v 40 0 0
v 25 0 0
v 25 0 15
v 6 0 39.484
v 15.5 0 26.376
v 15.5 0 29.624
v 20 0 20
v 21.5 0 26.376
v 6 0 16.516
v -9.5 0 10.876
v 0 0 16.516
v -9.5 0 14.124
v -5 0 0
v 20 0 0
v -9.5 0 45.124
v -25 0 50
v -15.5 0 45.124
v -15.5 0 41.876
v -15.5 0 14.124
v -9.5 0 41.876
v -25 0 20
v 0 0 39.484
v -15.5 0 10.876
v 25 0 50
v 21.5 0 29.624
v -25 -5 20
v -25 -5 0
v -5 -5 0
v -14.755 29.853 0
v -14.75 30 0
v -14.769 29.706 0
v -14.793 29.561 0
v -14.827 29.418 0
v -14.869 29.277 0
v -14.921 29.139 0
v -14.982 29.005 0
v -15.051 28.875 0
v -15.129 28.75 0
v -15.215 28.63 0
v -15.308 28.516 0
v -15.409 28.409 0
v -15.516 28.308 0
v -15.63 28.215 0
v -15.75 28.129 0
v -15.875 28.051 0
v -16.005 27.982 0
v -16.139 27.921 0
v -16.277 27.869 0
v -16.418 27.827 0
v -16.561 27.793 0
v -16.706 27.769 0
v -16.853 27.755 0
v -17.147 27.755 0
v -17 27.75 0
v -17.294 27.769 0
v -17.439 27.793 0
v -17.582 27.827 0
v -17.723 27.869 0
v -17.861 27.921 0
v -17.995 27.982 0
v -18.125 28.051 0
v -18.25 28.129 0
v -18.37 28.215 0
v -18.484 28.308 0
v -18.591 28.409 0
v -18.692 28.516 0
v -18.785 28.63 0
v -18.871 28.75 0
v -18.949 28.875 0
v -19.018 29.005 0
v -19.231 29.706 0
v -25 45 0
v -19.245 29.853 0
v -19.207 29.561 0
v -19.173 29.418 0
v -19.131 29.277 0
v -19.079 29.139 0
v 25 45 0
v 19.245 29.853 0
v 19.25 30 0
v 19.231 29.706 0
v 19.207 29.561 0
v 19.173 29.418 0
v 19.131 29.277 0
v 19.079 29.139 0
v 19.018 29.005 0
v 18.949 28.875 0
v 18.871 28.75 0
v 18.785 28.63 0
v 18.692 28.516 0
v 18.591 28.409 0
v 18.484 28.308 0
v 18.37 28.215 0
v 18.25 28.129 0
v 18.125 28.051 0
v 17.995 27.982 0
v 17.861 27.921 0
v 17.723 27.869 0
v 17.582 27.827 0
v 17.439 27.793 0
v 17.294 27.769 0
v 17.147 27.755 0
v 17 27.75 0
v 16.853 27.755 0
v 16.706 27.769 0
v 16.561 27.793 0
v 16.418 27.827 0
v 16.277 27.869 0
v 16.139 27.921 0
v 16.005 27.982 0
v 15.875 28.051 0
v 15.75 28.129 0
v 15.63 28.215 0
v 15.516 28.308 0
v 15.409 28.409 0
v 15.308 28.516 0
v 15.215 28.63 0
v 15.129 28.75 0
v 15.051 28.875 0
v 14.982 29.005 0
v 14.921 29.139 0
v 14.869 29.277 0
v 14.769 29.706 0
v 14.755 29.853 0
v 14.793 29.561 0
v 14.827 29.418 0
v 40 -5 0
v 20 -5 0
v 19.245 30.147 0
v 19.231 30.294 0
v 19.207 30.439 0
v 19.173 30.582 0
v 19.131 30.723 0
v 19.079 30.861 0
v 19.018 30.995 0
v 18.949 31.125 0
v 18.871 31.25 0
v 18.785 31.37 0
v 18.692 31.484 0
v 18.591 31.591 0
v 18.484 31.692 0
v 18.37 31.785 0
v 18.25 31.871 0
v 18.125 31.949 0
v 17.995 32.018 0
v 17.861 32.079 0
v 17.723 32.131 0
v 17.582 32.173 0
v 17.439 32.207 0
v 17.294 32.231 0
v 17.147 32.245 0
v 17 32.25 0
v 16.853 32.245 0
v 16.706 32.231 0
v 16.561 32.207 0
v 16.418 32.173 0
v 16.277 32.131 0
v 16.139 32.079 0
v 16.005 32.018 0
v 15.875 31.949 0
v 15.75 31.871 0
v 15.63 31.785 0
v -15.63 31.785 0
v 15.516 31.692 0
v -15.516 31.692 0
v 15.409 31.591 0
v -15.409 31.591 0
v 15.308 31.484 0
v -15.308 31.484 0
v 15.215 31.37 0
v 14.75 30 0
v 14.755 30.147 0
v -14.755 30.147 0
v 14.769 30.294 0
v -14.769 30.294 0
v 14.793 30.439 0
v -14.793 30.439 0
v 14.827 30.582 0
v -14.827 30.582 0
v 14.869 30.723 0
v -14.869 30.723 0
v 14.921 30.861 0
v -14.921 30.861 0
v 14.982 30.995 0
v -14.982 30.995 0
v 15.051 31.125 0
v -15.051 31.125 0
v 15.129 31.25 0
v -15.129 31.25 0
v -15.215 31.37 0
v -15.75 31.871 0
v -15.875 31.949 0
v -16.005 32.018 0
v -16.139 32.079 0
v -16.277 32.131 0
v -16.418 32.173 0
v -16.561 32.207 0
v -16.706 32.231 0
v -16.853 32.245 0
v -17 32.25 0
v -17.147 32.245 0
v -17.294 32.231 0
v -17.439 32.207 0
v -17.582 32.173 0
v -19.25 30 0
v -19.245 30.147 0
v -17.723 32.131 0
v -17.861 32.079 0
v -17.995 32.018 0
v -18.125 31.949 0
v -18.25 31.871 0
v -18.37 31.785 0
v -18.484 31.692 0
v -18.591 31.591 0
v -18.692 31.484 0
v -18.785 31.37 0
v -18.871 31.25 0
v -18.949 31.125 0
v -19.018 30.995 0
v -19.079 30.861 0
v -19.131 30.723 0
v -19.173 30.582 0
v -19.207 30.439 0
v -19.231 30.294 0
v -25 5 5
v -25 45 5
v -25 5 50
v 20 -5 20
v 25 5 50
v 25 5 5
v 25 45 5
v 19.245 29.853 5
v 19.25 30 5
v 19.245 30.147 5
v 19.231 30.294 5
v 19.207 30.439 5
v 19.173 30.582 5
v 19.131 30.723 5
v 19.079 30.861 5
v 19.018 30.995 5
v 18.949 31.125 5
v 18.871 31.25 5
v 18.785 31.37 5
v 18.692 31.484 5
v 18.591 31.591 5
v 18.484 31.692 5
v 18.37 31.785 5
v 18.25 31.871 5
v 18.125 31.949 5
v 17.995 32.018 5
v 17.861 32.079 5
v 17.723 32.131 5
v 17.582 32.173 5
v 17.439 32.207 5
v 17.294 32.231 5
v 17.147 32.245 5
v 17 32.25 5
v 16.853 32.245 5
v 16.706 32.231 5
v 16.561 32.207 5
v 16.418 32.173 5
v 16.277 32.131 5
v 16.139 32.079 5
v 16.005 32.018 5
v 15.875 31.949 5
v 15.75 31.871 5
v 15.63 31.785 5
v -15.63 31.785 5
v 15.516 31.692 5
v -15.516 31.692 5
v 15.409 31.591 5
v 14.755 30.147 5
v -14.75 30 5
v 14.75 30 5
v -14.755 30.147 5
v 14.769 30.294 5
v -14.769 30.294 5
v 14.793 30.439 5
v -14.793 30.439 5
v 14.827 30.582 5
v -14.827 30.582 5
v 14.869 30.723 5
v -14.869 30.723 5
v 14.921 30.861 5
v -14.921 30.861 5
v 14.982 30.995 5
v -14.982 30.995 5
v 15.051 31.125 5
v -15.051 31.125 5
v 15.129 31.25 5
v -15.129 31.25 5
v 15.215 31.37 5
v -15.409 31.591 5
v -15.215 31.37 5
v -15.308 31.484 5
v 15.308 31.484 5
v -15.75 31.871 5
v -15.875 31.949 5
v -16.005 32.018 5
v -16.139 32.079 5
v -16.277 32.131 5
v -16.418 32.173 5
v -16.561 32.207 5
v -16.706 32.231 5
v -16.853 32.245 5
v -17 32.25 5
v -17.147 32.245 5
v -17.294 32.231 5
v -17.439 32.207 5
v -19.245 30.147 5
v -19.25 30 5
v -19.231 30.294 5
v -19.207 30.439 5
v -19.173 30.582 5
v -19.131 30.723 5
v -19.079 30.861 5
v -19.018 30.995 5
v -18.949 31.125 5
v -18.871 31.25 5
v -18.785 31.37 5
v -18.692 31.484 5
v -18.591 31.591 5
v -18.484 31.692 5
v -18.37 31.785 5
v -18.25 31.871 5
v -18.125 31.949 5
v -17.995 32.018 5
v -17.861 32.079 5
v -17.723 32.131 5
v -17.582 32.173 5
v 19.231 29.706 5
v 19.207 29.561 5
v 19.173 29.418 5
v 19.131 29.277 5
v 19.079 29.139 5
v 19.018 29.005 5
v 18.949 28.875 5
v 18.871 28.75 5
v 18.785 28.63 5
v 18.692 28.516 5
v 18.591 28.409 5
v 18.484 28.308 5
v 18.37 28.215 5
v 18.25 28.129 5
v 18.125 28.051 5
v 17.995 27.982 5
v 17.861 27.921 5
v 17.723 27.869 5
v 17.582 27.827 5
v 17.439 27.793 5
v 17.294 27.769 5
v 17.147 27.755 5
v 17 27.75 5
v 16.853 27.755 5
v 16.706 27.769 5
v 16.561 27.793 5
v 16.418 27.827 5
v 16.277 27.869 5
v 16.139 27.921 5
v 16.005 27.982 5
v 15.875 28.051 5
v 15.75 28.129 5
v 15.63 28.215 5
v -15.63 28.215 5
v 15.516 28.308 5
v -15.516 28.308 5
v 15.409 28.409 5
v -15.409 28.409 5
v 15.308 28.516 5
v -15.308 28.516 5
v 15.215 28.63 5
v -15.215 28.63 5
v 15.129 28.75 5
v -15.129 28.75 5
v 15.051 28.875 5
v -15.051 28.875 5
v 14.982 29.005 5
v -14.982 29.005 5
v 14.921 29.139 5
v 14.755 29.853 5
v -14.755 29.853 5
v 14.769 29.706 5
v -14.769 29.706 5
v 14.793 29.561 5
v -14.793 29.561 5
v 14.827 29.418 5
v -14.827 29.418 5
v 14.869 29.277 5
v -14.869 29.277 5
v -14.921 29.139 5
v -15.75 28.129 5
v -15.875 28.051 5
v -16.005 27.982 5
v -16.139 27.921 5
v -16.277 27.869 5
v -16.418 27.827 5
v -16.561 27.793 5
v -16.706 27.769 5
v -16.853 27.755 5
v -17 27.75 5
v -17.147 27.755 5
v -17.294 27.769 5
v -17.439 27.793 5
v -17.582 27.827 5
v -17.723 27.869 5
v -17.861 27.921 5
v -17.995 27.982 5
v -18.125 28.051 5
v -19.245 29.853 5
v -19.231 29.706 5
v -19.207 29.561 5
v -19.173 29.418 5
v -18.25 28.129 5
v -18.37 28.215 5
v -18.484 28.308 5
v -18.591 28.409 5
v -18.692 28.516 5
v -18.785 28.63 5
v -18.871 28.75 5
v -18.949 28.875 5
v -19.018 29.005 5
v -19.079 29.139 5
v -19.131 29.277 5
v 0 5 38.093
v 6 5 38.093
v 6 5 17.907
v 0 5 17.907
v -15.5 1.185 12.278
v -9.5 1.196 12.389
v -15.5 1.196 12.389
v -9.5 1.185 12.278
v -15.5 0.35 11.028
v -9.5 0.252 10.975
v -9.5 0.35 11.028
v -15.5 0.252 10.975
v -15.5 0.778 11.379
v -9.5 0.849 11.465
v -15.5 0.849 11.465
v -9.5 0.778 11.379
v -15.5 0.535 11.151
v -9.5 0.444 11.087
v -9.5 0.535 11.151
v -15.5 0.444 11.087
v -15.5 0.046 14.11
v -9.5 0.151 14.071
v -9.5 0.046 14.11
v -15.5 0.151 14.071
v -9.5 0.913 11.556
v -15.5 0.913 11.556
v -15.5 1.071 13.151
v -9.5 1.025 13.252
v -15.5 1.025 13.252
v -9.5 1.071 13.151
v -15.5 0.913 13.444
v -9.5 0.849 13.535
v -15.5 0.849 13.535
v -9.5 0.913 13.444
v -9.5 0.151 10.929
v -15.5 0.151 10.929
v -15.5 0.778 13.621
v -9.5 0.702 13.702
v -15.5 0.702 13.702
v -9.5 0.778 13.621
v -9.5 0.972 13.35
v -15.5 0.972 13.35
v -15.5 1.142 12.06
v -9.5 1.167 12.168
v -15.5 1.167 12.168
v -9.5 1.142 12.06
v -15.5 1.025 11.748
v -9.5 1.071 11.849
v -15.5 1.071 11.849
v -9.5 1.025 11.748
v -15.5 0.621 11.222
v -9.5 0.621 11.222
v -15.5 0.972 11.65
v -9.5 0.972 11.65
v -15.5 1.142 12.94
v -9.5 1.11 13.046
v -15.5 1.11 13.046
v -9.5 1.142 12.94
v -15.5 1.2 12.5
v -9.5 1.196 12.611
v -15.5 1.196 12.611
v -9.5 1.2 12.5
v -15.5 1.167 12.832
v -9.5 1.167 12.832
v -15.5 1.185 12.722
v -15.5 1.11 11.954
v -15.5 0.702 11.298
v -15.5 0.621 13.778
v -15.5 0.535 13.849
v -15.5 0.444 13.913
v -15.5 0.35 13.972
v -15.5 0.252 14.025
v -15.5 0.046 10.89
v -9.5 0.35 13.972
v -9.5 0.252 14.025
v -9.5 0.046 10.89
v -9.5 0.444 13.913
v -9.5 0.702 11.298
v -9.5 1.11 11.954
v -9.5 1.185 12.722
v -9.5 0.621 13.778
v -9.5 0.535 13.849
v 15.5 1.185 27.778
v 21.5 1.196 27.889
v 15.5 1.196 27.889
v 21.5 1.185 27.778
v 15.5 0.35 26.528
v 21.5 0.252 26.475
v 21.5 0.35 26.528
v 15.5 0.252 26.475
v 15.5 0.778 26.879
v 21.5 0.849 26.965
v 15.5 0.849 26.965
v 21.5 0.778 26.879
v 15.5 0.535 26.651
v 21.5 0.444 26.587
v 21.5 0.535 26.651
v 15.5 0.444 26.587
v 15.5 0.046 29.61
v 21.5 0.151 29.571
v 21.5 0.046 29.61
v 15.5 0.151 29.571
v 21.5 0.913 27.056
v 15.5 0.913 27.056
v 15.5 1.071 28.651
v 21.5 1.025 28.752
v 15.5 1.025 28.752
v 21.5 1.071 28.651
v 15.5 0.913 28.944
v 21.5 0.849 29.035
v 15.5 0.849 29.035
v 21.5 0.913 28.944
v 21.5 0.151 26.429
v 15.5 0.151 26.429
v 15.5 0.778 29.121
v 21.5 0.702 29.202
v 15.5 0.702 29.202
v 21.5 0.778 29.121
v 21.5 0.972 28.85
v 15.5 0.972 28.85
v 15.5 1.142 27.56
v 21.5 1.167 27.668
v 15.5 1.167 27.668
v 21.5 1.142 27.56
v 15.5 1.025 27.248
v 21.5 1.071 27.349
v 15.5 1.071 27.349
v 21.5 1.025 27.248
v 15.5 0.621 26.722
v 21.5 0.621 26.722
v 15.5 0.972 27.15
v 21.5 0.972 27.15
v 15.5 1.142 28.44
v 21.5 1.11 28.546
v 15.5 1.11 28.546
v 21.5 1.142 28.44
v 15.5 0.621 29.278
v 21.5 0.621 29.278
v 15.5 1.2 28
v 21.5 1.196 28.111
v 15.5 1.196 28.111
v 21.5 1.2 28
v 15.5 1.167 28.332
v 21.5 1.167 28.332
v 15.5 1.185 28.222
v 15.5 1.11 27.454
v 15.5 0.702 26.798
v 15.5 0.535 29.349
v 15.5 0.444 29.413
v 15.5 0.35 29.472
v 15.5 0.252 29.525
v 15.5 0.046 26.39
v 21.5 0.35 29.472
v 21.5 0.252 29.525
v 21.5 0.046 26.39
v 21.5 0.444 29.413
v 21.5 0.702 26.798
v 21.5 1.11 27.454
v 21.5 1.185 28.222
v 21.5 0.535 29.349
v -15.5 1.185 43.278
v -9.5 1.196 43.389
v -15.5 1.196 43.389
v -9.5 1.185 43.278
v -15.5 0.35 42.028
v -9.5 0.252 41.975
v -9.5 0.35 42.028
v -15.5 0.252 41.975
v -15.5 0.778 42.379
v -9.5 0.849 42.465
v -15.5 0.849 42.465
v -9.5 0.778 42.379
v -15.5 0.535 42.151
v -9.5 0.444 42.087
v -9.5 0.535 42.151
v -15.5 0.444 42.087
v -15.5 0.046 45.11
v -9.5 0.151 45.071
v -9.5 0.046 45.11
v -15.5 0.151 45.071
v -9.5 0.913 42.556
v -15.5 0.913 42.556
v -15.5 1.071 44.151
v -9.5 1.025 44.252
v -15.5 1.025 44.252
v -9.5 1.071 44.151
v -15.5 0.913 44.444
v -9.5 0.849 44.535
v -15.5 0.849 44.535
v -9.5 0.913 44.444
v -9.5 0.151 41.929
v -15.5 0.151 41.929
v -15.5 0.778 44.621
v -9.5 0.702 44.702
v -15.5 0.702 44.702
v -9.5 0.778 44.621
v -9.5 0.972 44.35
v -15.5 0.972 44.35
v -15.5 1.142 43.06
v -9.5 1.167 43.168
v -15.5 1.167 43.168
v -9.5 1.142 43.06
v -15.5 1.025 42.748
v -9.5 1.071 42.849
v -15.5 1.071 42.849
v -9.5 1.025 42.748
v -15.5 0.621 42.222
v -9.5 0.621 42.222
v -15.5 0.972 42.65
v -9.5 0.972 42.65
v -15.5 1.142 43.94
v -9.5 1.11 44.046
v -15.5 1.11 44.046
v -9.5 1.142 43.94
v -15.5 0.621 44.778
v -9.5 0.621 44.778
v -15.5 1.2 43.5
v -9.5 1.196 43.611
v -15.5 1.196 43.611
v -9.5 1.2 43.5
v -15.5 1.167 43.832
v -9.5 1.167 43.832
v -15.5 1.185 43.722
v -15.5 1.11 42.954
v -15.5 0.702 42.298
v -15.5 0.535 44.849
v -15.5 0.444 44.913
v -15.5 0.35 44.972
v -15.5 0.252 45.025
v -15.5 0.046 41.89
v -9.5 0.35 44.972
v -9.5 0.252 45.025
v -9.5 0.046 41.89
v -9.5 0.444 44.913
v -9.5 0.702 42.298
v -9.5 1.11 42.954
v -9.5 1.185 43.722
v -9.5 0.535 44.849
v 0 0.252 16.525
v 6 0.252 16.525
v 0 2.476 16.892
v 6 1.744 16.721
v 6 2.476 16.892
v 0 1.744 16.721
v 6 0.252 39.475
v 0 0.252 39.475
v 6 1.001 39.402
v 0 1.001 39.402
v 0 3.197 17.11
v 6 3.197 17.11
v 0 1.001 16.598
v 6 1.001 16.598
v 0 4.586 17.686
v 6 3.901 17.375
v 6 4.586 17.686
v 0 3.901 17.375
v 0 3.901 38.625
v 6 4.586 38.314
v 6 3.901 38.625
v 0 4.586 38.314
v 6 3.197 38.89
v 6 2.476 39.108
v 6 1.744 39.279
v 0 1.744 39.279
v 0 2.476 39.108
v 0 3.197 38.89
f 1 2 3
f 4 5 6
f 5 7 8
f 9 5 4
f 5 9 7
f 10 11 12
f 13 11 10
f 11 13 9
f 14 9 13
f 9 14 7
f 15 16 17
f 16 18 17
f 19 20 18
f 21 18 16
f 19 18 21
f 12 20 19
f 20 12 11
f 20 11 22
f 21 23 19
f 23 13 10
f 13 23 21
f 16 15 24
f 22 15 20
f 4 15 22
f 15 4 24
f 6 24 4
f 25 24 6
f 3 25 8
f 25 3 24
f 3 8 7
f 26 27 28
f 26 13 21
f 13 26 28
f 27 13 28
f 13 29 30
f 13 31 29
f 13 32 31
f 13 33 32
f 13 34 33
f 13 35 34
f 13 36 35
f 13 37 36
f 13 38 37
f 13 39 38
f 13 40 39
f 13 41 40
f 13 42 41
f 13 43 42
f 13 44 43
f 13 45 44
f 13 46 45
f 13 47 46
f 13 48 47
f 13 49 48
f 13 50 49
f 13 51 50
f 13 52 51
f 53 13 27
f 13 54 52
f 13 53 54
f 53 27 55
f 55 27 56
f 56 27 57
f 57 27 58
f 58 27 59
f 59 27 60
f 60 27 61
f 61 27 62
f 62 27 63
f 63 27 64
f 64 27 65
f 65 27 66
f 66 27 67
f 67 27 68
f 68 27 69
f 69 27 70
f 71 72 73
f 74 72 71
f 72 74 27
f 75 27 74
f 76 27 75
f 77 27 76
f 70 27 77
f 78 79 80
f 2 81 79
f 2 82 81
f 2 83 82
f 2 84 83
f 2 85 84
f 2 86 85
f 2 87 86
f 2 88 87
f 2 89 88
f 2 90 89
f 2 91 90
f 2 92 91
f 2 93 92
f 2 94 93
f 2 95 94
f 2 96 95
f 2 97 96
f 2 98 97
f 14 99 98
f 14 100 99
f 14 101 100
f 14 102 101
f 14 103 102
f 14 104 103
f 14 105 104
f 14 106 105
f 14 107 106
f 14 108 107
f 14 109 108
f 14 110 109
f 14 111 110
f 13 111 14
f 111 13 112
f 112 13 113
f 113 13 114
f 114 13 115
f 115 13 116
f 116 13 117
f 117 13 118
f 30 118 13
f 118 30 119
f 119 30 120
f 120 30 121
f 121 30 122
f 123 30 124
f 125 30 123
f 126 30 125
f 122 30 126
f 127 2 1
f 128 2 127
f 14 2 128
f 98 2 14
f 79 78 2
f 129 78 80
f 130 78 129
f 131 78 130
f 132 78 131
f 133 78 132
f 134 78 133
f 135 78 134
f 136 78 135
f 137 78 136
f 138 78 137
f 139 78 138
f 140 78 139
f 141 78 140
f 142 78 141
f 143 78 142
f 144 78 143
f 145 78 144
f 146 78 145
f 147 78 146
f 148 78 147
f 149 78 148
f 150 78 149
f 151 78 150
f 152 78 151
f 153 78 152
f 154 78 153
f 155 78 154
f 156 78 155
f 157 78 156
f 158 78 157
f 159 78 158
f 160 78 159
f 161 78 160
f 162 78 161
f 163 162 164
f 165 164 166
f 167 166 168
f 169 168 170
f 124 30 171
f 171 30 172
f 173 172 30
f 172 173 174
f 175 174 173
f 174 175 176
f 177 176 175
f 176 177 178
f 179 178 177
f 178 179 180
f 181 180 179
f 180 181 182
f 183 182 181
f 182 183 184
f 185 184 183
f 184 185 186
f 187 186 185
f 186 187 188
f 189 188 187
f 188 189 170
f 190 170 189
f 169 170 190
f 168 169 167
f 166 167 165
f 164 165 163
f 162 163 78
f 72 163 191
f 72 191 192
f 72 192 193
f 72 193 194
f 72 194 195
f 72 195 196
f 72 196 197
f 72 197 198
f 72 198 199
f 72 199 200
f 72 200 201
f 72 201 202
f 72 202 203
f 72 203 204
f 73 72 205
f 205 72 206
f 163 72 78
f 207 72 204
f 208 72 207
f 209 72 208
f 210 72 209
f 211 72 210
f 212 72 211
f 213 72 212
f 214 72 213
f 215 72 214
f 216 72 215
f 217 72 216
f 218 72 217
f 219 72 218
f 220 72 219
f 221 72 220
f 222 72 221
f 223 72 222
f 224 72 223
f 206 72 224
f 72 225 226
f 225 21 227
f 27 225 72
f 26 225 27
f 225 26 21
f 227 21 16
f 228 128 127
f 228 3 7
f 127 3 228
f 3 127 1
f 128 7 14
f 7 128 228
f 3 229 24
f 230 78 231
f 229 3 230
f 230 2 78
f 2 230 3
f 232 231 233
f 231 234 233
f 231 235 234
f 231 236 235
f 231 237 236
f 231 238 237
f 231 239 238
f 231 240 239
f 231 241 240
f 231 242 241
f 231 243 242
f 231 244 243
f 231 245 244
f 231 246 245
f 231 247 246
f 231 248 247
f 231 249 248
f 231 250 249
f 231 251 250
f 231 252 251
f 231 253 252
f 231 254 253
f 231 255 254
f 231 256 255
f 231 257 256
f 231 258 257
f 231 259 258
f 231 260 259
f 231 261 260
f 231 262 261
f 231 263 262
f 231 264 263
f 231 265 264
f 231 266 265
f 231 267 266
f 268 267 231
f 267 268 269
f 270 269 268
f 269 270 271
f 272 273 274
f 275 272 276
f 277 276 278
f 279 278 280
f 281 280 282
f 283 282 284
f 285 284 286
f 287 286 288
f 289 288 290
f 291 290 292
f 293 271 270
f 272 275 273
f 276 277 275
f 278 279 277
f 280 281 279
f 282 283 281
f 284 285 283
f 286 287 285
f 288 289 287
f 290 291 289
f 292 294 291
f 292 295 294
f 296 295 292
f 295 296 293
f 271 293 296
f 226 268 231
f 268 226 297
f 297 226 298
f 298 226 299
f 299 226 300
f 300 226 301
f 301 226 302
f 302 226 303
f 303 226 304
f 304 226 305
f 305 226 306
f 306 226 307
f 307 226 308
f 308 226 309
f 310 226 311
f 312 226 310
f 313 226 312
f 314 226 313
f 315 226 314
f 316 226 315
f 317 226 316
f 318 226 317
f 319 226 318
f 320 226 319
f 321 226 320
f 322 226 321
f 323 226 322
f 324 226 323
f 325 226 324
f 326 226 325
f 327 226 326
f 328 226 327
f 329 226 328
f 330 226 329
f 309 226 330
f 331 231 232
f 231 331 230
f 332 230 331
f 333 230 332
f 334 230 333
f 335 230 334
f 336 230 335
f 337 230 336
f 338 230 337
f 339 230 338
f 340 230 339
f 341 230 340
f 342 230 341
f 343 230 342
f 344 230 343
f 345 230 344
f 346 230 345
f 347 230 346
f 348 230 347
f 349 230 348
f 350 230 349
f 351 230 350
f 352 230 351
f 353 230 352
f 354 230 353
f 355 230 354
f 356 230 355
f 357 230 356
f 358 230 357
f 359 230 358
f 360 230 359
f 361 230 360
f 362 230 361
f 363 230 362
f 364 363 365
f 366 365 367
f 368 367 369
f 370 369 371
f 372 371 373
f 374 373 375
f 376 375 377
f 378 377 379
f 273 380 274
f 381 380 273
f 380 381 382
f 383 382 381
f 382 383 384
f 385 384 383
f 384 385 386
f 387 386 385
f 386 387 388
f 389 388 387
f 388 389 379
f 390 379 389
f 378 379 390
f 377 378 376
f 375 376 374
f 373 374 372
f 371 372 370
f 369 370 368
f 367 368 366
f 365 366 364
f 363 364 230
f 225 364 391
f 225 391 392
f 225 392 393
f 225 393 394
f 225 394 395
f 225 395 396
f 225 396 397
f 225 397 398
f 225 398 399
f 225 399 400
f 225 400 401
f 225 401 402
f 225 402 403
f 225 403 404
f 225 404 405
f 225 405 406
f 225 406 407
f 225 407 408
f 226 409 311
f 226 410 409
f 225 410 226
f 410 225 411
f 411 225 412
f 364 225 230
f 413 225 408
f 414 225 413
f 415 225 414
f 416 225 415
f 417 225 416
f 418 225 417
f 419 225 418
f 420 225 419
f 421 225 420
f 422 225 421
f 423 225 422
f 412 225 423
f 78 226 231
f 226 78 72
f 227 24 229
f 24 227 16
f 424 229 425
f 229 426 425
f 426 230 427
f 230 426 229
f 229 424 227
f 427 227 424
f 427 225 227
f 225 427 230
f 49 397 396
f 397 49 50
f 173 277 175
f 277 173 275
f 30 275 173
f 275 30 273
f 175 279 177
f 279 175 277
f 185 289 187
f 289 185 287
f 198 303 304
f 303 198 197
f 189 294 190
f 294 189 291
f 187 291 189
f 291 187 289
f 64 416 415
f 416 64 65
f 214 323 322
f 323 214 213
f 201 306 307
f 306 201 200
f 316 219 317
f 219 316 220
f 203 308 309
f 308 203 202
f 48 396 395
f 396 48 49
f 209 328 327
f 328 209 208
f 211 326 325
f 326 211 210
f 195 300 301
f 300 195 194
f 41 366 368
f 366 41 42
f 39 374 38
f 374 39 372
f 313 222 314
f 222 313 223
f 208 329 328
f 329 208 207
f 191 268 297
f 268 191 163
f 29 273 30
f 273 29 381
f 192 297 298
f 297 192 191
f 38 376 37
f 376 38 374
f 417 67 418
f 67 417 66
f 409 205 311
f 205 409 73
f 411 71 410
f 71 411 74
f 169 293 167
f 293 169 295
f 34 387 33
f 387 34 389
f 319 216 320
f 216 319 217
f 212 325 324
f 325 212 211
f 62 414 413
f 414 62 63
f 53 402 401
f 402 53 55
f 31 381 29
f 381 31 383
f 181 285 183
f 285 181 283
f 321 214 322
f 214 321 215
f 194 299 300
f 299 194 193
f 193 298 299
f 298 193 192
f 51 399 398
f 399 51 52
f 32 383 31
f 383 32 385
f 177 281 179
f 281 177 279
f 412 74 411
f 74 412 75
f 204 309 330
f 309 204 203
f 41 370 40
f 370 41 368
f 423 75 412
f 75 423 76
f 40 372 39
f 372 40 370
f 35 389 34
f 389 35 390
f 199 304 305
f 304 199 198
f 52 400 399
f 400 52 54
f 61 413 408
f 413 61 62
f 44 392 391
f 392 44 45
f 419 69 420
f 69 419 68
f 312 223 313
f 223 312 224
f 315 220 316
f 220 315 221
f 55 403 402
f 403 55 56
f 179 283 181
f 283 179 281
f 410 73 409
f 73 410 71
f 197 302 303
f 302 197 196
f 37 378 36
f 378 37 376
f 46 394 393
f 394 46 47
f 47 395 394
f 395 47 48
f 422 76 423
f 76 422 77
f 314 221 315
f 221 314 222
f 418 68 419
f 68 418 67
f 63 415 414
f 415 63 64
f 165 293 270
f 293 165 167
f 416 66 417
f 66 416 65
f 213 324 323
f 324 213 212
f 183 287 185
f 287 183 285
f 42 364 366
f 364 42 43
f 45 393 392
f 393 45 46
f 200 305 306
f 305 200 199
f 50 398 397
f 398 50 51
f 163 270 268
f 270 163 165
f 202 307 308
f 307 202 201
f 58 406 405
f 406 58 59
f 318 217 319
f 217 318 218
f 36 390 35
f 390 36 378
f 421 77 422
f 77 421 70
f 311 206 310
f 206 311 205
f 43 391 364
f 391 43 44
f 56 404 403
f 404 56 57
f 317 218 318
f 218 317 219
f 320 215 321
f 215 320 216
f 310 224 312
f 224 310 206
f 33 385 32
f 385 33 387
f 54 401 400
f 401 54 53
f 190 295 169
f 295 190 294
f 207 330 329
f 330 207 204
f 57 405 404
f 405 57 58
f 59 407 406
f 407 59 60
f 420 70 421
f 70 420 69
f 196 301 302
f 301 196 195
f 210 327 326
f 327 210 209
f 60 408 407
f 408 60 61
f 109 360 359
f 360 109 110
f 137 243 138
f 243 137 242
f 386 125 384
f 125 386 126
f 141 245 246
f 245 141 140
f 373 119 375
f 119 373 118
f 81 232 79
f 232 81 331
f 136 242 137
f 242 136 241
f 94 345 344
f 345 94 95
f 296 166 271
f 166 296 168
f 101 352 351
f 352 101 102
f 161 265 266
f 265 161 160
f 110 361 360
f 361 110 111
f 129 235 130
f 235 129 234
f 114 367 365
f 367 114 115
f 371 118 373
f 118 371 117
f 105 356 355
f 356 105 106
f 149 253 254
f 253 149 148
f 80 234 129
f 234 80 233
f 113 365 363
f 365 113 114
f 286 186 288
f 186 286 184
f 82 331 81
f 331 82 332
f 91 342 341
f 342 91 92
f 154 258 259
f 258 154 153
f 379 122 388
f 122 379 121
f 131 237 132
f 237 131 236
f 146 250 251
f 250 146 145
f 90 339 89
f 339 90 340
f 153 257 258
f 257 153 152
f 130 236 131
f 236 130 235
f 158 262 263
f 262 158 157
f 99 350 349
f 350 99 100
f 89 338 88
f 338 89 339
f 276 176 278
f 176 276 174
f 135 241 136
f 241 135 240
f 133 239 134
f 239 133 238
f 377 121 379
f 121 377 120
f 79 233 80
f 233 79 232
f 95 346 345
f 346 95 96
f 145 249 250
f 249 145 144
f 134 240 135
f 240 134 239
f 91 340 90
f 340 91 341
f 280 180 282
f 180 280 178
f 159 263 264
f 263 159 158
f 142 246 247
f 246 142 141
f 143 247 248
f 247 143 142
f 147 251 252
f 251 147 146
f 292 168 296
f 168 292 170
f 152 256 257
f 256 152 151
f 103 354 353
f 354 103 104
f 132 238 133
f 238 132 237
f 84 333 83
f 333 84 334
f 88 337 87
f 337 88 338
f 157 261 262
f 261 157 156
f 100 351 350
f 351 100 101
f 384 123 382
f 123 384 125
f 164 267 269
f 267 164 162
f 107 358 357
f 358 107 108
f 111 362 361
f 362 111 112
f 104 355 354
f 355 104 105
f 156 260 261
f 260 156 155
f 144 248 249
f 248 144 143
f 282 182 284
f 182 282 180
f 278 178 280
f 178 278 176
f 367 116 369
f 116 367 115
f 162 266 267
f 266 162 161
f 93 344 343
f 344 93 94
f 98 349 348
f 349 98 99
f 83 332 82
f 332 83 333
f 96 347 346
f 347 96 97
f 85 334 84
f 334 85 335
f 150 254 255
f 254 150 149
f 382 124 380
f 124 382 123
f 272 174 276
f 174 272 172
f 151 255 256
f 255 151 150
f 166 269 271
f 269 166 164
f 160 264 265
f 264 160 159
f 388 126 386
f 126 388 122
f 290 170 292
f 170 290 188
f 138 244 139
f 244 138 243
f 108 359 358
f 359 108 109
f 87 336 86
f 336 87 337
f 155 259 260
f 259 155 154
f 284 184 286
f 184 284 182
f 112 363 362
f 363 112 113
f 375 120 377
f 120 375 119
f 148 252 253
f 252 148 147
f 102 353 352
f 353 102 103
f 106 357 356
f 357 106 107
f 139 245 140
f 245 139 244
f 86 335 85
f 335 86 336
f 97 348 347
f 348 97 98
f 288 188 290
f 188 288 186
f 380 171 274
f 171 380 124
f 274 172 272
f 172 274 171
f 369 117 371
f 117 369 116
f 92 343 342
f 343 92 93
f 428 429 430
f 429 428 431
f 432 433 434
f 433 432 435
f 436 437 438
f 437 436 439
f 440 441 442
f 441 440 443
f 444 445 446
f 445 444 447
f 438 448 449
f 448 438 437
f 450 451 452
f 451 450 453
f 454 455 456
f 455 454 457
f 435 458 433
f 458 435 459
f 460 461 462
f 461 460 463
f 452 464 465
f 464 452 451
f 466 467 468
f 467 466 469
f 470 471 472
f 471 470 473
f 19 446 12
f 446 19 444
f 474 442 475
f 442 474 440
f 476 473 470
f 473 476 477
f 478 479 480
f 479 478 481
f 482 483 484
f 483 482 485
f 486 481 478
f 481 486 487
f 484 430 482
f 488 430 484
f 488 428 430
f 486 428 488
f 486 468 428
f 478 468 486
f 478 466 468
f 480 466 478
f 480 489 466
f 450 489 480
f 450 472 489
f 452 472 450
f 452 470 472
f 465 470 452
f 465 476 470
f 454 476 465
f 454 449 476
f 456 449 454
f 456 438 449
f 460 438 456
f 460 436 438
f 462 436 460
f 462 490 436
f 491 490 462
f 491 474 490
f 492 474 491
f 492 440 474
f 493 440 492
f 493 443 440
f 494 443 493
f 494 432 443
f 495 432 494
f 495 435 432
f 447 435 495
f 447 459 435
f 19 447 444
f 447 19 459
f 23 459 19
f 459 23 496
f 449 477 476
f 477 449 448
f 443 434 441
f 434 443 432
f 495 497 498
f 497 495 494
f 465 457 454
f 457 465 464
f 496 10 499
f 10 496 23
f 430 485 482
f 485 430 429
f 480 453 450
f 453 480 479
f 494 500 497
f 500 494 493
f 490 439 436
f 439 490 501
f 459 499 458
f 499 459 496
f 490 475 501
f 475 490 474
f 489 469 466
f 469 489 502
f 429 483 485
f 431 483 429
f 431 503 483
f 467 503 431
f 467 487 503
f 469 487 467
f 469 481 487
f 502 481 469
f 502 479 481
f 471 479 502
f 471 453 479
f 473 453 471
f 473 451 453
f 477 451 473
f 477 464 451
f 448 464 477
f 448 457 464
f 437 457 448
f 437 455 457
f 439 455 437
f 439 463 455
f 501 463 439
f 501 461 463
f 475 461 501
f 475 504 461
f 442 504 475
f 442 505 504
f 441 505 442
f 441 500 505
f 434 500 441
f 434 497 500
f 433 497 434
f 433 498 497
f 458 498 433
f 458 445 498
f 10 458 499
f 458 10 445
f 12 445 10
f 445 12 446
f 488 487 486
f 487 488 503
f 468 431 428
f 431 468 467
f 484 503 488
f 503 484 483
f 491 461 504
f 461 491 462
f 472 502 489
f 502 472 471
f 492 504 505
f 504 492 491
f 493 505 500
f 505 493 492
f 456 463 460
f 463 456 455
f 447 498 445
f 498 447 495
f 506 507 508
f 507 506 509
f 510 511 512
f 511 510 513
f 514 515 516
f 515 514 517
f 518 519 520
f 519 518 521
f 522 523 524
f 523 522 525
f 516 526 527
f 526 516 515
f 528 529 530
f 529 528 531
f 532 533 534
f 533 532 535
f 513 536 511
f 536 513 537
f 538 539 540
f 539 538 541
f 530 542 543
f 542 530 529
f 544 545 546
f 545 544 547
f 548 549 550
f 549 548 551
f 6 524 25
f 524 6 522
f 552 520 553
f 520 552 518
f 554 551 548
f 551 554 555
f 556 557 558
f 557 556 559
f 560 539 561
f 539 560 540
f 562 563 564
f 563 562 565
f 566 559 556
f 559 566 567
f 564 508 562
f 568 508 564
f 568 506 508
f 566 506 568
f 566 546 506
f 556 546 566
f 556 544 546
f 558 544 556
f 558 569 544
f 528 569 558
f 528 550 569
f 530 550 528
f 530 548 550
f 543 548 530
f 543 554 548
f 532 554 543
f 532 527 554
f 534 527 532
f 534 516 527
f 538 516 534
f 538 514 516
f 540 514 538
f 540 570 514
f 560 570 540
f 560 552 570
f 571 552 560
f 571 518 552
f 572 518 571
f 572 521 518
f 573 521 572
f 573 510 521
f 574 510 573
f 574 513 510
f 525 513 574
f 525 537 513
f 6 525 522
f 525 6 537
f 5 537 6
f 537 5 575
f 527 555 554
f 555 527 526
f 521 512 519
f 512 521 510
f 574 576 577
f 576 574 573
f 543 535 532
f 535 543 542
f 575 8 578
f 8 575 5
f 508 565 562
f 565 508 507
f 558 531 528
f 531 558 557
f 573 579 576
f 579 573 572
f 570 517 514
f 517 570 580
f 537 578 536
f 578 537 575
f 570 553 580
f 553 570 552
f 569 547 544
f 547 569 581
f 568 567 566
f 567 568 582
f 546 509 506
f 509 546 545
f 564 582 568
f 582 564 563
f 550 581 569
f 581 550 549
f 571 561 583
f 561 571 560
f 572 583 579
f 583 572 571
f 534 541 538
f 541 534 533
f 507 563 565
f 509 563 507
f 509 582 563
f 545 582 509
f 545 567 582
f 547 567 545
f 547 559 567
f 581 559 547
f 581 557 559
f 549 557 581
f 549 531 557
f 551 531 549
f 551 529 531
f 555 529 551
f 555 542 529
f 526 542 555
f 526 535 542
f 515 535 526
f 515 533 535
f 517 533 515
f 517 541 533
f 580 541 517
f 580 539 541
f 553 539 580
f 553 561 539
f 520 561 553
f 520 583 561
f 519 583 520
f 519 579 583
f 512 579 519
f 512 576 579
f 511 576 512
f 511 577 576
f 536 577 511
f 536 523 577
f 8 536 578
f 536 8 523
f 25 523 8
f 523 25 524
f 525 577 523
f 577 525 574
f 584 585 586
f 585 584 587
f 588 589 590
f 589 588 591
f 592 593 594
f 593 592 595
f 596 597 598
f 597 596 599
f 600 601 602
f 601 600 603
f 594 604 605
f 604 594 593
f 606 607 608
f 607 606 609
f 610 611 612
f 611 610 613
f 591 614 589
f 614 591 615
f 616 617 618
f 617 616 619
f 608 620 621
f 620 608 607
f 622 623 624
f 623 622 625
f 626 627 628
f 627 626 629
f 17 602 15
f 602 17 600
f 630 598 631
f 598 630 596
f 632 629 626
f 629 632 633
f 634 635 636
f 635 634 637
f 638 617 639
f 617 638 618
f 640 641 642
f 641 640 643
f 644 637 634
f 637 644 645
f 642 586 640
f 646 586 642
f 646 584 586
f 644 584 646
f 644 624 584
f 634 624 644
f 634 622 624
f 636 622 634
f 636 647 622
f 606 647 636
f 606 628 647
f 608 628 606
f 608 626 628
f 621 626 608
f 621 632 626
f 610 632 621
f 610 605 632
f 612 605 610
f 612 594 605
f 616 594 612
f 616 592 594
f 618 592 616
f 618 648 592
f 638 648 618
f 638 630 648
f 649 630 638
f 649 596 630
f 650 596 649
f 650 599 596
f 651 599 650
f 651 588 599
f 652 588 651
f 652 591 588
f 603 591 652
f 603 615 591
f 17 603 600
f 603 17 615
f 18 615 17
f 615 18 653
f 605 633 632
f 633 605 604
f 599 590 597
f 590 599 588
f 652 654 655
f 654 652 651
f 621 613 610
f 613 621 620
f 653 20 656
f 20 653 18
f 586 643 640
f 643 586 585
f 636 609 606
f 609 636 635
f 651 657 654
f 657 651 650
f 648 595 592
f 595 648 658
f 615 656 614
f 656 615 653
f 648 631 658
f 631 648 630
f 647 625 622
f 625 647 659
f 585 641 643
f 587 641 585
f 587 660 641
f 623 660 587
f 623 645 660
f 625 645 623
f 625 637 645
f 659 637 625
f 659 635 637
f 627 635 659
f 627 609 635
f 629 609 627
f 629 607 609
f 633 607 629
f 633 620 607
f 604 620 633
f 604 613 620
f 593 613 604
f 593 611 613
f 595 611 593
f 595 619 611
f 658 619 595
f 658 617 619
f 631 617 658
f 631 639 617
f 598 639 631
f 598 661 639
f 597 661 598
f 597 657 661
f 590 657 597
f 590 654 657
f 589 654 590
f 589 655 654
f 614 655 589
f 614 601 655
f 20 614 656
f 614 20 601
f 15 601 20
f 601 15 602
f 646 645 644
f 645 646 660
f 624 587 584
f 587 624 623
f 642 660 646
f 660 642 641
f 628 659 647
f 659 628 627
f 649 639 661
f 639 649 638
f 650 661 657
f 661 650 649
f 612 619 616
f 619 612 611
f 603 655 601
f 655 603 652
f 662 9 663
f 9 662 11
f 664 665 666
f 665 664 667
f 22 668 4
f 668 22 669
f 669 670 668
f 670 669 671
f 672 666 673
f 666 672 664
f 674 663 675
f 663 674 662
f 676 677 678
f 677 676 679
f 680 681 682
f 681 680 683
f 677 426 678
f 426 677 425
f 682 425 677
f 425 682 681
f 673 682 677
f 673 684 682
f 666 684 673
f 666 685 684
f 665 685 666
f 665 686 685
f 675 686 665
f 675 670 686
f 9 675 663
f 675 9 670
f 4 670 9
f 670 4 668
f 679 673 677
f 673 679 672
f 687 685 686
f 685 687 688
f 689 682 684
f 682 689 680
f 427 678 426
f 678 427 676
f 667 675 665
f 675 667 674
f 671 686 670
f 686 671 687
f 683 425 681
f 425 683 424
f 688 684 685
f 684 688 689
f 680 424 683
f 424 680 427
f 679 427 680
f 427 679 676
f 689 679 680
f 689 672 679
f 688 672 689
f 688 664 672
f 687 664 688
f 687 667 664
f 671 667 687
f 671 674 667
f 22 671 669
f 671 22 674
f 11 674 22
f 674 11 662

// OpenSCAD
// L-shaped mounting bracket for a NEMA 17 stepper motor (e.g. syringe pump)
// Print orientation: base plate on the bed (z = 0), vertical plate builds upward.

// ---------------- Parameters ----------------
base_x0      = -25;    // base plate, x start
base_x1      = 25;     // base plate, x end
base_y0      = 0;      // base plate, y start
base_y1      = 45;     // base plate, y end
base_z0      = 0;      // base plate, z start
base_z1      = 5;      // base plate, z end

motor_x0     = -25;    // motor plate, x start
motor_x1     = 25;     // motor plate, x end
motor_y0     = 0;      // motor plate, y start
motor_y1     = 5;      // motor plate, y end
motor_z0     = 0;      // motor plate, z start
motor_z1     = 50;     // motor plate, z end

boss_d       = 23;     // motor centring boss hole diameter
boss_x       = 0;      // boss hole centre, x
boss_z       = 28;     // boss hole centre, z

screw_d      = 3.4;    // M3 screw holes diameter
screw_p      = 31;     // screw pattern size (square)
screw_count  = 4;      // number of screw holes

eps          = 0.5;    // cutter overshoot past faces

$fn = 96;              // curve resolution

// ---------------- Model ----------------
difference() {
    union() {
        // Base plate
        translate([base_x0, base_y0, base_z0])
            cube([base_x1 - base_x0, base_y1 - base_y0, base_z1 - base_z0]);

        // Vertical motor plate
        translate([motor_x0, motor_y0, motor_z0])
            cube([motor_x1 - motor_x0, motor_y1 - motor_y0, motor_z1 - motor_z0]);

        // Gussets: right triangles in YZ, 5 mm thick, flush with left/right edges
        for (sx = [-1, 1])
            translate([sx > 0 ? motor_x1 - 5 : base_x0, 0, 0])
                rotate([90, 0, 0])
                    linear_extrude(height = 5)
                        polygon([
                            [0, 0],
                            [20, 0],
                            [0, 20]
                        ]);
    }

    // Base plate M4 through-holes
    for (x = [-17, 17], y = 30)
        translate([x, y, -eps])
            cylinder(d = 4.5, h = base_z1 + 2 * eps);

    // Motor plate boss hole (along Y)
    translate([boss_x, motor_y0 - eps, boss_z])
        rotate([0, 90, 0])
            cylinder(d = boss_d, h = motor_y1 - motor_y0 + 2 * eps);

    // M3 screw holes on a square pattern centred on the boss hole
    for (i = [0 : screw_count - 1]) {
        x = (i % 2 - 0.5) * screw_p;
        z = (i / 2 - 0.5) * screw_p + boss_z;
        translate([x, motor_y0 - eps, z])
            rotate([0, 90, 0])
                cylinder(d = screw_d, h = motor_y1 - motor_y0 + 2 * eps);
    }
}
